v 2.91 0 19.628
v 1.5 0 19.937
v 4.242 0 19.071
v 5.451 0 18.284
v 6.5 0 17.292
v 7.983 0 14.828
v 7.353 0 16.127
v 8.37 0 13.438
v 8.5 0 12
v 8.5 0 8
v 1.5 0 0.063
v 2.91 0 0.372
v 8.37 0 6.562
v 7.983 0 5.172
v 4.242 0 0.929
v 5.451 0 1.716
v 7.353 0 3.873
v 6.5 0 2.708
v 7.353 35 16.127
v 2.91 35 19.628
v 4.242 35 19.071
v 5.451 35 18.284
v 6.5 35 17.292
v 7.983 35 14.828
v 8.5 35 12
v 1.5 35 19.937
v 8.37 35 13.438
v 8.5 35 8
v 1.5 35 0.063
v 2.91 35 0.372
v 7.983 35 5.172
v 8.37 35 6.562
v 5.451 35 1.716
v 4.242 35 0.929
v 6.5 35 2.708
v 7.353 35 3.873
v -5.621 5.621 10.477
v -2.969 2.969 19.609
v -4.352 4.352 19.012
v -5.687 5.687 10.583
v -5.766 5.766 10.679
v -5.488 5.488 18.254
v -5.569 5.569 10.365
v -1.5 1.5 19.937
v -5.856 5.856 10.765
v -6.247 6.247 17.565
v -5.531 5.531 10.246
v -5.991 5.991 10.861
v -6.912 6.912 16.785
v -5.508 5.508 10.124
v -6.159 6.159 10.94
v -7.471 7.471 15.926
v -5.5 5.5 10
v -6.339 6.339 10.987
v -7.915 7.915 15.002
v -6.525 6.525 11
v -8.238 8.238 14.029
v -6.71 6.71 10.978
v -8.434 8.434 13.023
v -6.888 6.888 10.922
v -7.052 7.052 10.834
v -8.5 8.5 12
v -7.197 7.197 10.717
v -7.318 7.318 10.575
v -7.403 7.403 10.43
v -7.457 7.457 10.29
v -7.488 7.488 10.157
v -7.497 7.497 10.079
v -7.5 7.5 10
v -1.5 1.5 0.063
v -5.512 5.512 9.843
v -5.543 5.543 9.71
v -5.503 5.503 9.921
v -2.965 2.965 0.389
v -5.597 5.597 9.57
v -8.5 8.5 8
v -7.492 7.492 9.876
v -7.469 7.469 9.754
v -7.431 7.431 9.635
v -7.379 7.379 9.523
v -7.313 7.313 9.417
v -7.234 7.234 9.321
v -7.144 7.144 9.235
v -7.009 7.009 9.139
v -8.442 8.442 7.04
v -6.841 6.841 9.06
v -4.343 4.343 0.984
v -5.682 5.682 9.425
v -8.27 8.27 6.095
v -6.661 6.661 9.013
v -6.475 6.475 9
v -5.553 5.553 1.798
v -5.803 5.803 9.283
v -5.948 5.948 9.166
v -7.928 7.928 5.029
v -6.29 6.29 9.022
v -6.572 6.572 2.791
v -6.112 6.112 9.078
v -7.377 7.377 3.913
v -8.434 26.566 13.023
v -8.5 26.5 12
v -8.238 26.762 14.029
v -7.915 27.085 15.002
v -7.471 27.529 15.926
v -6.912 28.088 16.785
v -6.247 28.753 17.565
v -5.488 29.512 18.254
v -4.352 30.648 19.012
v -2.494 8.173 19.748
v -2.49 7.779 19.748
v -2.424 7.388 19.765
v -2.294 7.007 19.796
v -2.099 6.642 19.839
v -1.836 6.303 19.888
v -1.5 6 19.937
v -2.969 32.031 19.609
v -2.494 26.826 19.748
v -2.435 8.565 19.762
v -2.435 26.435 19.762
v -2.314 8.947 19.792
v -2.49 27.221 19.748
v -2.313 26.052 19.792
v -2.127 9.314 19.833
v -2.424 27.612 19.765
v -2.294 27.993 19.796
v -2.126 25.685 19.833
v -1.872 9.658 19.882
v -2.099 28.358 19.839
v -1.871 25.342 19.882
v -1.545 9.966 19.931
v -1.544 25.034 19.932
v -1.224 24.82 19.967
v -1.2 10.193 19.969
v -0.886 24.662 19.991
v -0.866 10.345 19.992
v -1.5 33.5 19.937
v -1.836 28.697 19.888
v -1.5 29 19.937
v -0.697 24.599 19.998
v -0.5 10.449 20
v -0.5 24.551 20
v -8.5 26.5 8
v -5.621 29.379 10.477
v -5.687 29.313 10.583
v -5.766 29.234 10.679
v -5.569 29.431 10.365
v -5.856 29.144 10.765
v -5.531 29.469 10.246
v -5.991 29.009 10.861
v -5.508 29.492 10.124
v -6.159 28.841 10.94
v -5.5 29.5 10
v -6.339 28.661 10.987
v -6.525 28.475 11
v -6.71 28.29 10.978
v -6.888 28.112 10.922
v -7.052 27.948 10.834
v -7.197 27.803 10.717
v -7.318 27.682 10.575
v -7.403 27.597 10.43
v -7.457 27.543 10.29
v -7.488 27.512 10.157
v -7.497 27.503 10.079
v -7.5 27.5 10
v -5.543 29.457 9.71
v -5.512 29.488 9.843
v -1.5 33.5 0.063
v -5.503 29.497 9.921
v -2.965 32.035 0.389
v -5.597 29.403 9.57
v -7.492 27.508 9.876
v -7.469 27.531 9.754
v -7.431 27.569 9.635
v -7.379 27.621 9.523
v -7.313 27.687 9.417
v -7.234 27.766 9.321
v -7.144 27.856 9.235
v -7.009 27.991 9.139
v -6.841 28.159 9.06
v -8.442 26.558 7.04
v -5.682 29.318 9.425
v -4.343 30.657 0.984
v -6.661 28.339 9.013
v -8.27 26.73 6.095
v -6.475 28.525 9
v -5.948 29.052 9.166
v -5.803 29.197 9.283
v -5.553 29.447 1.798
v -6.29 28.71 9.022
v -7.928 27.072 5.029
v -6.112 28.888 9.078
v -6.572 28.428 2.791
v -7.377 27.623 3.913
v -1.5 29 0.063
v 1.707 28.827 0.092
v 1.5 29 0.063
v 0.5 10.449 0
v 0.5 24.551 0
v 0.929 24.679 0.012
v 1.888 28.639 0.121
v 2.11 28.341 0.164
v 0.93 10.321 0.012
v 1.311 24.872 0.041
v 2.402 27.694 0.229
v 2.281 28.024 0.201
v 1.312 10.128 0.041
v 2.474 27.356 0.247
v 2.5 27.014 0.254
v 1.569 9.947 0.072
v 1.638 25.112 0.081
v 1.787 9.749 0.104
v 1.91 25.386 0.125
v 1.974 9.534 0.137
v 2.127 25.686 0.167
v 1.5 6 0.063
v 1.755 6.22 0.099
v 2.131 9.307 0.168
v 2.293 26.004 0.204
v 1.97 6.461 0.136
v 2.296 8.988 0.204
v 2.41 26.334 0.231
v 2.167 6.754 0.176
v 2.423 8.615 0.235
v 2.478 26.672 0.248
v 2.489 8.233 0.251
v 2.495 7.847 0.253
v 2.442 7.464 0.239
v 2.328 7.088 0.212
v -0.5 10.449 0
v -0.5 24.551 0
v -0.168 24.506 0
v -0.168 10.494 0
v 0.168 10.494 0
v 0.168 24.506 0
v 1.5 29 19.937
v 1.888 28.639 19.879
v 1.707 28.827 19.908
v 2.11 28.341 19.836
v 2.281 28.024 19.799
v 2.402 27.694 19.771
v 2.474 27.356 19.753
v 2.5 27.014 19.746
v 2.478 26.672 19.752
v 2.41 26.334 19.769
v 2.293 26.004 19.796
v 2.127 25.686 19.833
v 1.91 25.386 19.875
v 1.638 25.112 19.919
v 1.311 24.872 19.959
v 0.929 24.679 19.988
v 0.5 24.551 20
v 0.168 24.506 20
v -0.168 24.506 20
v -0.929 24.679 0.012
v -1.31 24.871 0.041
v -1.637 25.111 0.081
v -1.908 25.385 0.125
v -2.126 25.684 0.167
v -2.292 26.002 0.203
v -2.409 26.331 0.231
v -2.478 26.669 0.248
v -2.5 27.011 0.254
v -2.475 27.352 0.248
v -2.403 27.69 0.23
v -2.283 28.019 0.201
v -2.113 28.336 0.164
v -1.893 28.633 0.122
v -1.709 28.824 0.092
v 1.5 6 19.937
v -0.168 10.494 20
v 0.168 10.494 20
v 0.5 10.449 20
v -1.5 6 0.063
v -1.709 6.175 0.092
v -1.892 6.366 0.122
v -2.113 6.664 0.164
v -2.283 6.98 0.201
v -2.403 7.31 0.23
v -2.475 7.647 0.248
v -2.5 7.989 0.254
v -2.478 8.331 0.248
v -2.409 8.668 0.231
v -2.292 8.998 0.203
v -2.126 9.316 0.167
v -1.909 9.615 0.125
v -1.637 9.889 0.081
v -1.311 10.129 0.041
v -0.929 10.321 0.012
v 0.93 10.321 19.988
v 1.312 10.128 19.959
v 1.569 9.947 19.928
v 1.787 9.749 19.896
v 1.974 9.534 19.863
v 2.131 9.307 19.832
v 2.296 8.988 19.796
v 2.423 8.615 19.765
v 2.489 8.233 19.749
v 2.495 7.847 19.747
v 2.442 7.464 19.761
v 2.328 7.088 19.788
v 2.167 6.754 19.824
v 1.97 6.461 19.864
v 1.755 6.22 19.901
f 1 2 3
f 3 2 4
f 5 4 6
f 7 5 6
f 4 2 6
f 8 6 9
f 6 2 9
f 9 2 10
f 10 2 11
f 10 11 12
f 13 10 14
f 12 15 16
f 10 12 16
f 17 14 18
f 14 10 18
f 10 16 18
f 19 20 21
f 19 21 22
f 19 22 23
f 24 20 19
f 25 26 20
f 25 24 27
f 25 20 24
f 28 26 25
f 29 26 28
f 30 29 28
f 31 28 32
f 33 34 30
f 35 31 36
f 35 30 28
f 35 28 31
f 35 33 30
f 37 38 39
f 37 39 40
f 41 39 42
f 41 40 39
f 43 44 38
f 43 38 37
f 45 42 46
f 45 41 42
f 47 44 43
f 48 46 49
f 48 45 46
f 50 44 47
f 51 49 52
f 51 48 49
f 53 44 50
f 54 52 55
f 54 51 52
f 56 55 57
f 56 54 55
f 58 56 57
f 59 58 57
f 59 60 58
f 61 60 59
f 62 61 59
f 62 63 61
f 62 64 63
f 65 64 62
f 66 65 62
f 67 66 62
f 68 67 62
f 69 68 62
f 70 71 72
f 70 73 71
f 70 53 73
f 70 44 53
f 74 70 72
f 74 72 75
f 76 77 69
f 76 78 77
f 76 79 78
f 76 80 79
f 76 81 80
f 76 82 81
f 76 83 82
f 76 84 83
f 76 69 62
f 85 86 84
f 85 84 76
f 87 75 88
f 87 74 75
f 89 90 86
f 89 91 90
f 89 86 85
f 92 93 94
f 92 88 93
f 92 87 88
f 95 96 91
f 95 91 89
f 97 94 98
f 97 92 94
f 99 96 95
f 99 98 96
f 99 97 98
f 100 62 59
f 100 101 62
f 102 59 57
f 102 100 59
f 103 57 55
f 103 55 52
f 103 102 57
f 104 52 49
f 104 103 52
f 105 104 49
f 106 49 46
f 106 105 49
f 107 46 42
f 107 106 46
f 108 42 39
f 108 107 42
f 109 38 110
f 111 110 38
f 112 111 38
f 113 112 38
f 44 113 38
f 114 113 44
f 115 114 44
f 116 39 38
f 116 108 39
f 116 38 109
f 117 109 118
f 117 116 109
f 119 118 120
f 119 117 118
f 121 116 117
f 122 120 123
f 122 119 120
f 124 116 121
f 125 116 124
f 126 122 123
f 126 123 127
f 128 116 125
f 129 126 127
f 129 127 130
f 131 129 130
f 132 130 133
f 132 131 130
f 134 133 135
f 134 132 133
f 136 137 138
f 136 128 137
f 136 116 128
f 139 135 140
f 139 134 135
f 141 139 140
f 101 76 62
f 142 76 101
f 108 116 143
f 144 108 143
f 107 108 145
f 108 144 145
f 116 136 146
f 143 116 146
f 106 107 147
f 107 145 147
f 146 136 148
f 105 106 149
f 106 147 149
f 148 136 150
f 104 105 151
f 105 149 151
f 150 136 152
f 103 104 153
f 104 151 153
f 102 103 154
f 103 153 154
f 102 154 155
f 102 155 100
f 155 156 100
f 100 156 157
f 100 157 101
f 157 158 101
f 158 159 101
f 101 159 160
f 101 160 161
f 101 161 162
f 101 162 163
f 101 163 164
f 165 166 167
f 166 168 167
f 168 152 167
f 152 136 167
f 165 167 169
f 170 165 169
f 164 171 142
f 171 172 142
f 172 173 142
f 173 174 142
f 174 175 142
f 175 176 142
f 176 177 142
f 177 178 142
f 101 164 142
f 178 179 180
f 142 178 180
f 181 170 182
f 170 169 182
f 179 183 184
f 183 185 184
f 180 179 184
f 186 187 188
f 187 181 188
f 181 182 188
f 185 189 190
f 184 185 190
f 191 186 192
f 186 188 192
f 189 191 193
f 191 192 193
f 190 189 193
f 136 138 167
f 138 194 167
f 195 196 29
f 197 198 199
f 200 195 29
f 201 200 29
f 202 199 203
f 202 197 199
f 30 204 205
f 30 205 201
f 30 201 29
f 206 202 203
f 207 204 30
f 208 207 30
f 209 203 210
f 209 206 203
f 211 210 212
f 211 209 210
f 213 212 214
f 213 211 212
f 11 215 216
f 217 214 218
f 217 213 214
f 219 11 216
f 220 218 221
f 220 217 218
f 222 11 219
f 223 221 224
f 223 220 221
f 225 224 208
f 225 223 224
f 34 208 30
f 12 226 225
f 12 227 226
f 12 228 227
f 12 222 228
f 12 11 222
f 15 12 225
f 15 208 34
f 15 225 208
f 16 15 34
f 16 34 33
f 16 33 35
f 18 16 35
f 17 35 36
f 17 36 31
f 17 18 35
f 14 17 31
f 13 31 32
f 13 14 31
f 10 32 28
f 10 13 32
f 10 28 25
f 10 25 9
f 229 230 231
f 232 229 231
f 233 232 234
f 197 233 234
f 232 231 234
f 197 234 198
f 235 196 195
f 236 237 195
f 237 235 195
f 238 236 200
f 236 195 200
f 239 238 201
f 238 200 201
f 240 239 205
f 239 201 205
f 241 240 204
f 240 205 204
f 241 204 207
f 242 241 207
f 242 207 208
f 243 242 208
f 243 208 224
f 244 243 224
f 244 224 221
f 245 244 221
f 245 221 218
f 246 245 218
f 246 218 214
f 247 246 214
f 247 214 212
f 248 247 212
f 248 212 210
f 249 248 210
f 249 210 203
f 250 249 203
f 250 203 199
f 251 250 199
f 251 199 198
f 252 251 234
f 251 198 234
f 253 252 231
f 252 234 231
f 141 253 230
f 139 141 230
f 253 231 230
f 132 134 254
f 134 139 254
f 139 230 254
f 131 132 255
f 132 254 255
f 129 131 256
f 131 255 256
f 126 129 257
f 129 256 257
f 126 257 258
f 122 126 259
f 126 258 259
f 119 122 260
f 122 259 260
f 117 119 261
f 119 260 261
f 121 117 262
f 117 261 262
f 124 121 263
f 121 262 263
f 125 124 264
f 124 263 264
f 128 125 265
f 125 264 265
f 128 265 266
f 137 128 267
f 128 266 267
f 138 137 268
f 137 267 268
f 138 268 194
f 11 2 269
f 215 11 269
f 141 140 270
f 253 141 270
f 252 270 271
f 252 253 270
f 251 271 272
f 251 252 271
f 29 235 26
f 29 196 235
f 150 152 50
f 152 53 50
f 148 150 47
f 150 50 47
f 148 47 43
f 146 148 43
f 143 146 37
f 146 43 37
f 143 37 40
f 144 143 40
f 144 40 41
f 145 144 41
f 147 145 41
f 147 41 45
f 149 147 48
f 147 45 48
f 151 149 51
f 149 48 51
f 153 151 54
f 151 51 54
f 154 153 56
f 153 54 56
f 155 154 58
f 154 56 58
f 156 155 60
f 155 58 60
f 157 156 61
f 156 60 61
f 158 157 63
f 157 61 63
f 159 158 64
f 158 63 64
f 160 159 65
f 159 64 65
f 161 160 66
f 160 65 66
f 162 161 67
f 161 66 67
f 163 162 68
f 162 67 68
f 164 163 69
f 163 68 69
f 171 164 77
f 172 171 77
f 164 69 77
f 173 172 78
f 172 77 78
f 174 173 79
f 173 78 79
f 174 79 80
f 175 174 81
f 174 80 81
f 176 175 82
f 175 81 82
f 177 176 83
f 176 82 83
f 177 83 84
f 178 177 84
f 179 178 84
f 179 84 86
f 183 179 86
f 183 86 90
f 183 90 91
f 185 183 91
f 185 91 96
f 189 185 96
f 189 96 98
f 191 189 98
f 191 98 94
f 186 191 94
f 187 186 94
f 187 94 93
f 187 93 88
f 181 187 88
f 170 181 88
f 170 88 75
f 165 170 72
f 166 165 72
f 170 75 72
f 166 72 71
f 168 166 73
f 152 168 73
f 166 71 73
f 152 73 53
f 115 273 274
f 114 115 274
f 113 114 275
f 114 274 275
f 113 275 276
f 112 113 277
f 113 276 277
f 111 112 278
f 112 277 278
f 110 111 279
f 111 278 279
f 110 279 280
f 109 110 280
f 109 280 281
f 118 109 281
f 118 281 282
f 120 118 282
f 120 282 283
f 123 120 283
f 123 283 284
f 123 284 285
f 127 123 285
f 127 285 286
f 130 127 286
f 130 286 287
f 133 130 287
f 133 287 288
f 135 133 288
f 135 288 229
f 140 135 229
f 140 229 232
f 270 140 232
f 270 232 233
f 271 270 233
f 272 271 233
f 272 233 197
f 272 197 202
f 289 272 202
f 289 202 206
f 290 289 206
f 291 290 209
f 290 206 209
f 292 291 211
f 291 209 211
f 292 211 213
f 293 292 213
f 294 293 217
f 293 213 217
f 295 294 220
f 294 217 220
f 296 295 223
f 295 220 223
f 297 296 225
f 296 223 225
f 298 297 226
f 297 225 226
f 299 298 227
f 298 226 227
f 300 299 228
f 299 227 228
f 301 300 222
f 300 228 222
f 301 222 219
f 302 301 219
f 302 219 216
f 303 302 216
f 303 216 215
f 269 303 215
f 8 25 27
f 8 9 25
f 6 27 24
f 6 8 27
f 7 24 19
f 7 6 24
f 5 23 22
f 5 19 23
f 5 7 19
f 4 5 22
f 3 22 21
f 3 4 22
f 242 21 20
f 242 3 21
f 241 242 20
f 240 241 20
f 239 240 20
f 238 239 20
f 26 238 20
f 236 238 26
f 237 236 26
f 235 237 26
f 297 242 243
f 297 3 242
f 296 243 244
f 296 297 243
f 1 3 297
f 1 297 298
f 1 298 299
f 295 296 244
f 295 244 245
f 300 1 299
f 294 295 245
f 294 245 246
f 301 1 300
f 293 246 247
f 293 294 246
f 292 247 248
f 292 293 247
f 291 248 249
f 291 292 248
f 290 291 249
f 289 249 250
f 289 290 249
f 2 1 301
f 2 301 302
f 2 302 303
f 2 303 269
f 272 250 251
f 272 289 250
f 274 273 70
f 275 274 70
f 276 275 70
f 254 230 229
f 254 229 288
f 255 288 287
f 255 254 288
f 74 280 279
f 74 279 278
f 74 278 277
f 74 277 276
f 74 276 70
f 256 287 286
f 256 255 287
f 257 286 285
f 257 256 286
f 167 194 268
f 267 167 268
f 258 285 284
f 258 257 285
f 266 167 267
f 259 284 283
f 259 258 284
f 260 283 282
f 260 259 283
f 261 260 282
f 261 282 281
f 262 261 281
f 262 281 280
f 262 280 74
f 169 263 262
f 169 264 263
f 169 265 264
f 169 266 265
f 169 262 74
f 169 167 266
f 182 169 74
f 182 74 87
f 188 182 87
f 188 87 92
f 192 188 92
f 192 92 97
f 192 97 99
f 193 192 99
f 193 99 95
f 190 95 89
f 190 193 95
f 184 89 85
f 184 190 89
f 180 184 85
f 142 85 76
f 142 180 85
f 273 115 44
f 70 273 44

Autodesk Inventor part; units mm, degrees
ref_plane "YZ Plane" through (0, 0, 0) normal (1, 0, 0) x (0, 1, 0)
ref_plane "XZ Plane" through (0, 0, 0) normal (0, 1, 0) x (-1, 0, 0)
ref_plane "XY Plane" through (0, 0, 0) normal (0, 0, 1) x (1, 0, 0)
sketch "Sketch1" plane through (0, 0, 0) normal (0, 0, 1) x (1, 0, 0)
  line L0 (0, 0) -> (2.5, 0)
  line L1 (2.5, 0) -> (2.5, 35)
  line L2 (2.5, 35) -> (-2.5, 35)
  line L3 (-2.5, 35) -> (-2.5, 0)
  circle A0 centre (0, 0) radius 8.5
  line L4 (0, 35) -> (8.5, 35) construction
  circle A1 centre (0, 35) radius 8.5
  line L5 (-8.5, 0) -> (-8.5, 35)
  line L6 (8.5, 35) -> (8.5, 0)
  line L7 (0, 35) -> (8.5, 35)
  line L8 (0, 35) -> (-8.5, 26.5)
  line L9 (0, 35) -> (12.0208, 35) construction
  line L10 (0, 0) -> (8.5, 0)
  line L11 (0, 0) -> (-8.5, 8.5)
  line L12 (0, 0) -> (12.0208, 0) construction
  dimension "d9" = 17
  dimension "d1" = 2.5
  dimension "d2" = 35
  dimension "d3" = 5
  dimension "d5" = 17
  dimension "d10" = 2.5
  dimension "d11" = 0
  dimension "d12" = 135
  dimension "d13" = 135
extrude "Extrusion1" add sketch "Sketch1" along normal blind 20 contours L11 L3 A0 L1 L0 | L1 A0 L10 | L11 A0 L3 | A0 L3 A1 L1 | L1 A1 L6 A0 | A0 L11 L5 L8 A1 L3 | A1 L3 L8 L2 L1 | L1 L7 A1 | A1 L8 L3
sketch "Sketch2" plane through (0, 0, 0) normal (0, 0, -1) x (-1, 0, 0)
  line L0 (0, 0) -> (-8.5, 0) projected
  line L1 (0, 0) -> (0, 8)
  circle A0 centre (0, 8) radius 2.5
  line L2 (8.5, 8.5) -> (0, 0) projected
  line L3 (0, 0) -> (-1.5, 0)
  line L4 (-1.5, 0) -> (-1.5, 8)
  line L5 (-1.5, 8) -> (1.5, 8)
  line L6 (1.5, 8) -> (1.5, 0)
  line L7 (1.5, 0) -> (0, 0)
  line L8 (0, 35) -> (8.5, 26.5) projected
  line L9 (0, 35) -> (0, 27)
  line L10 (0, 27) -> (-1.5, 27)
  line L11 (-1.5, 27) -> (-1.5, 35)
  line L12 (-8.5, 35) -> (0, 35) projected
  line L13 (0, 27) -> (1.5, 27)
  line L14 (1.5, 27) -> (1.5, 35)
  line L15 (1.5, 35) -> (0, 35)
  circle A1 centre (0, 27) radius 2.5
  point P0 (1.5, 45)
  point P1 (-1.5, 29)
  point P2 (1.5, 29)
  point P3 (-1.5, 6)
  point P4 (1.5, 6)
  dimension "d16" = 8
  dimension "d17" = 5
  dimension "d18" = 1.5
  dimension "d19" = 3
  dimension "d20" = 8
  dimension "d21" = 1.5
  dimension "d22" = 1.5
  dimension "d23" = 5
extrude "Extrusion2" cut sketch "Sketch2" against normal through all
fillet "Fillet1" radius 8 4 edges at (8.5, 17.5, 0) (8.5, 17.5, 20) (-8.5, 17.5, 0) (-8.5, 17.5, 20)
sketch "Sketch4" plane through (1.5, 0, 0.0627) normal (0, -1, 0) x (1, 0, 0)
  line L0 (-10, 7.9373) -> (-10, 11.9373) projected
  line L1 (-10, 9.9373) -> (-8, 9.9373)
  circle A0 centre (-8, 9.9373) radius 1
  point P0 (-1.5, -0.0627)
  dimension "d31" = 2
  dimension "d32" = 2
extrude "Extrusion4" cut sketch "Sketch4" against normal through all
properties part number "pinky_f1"
